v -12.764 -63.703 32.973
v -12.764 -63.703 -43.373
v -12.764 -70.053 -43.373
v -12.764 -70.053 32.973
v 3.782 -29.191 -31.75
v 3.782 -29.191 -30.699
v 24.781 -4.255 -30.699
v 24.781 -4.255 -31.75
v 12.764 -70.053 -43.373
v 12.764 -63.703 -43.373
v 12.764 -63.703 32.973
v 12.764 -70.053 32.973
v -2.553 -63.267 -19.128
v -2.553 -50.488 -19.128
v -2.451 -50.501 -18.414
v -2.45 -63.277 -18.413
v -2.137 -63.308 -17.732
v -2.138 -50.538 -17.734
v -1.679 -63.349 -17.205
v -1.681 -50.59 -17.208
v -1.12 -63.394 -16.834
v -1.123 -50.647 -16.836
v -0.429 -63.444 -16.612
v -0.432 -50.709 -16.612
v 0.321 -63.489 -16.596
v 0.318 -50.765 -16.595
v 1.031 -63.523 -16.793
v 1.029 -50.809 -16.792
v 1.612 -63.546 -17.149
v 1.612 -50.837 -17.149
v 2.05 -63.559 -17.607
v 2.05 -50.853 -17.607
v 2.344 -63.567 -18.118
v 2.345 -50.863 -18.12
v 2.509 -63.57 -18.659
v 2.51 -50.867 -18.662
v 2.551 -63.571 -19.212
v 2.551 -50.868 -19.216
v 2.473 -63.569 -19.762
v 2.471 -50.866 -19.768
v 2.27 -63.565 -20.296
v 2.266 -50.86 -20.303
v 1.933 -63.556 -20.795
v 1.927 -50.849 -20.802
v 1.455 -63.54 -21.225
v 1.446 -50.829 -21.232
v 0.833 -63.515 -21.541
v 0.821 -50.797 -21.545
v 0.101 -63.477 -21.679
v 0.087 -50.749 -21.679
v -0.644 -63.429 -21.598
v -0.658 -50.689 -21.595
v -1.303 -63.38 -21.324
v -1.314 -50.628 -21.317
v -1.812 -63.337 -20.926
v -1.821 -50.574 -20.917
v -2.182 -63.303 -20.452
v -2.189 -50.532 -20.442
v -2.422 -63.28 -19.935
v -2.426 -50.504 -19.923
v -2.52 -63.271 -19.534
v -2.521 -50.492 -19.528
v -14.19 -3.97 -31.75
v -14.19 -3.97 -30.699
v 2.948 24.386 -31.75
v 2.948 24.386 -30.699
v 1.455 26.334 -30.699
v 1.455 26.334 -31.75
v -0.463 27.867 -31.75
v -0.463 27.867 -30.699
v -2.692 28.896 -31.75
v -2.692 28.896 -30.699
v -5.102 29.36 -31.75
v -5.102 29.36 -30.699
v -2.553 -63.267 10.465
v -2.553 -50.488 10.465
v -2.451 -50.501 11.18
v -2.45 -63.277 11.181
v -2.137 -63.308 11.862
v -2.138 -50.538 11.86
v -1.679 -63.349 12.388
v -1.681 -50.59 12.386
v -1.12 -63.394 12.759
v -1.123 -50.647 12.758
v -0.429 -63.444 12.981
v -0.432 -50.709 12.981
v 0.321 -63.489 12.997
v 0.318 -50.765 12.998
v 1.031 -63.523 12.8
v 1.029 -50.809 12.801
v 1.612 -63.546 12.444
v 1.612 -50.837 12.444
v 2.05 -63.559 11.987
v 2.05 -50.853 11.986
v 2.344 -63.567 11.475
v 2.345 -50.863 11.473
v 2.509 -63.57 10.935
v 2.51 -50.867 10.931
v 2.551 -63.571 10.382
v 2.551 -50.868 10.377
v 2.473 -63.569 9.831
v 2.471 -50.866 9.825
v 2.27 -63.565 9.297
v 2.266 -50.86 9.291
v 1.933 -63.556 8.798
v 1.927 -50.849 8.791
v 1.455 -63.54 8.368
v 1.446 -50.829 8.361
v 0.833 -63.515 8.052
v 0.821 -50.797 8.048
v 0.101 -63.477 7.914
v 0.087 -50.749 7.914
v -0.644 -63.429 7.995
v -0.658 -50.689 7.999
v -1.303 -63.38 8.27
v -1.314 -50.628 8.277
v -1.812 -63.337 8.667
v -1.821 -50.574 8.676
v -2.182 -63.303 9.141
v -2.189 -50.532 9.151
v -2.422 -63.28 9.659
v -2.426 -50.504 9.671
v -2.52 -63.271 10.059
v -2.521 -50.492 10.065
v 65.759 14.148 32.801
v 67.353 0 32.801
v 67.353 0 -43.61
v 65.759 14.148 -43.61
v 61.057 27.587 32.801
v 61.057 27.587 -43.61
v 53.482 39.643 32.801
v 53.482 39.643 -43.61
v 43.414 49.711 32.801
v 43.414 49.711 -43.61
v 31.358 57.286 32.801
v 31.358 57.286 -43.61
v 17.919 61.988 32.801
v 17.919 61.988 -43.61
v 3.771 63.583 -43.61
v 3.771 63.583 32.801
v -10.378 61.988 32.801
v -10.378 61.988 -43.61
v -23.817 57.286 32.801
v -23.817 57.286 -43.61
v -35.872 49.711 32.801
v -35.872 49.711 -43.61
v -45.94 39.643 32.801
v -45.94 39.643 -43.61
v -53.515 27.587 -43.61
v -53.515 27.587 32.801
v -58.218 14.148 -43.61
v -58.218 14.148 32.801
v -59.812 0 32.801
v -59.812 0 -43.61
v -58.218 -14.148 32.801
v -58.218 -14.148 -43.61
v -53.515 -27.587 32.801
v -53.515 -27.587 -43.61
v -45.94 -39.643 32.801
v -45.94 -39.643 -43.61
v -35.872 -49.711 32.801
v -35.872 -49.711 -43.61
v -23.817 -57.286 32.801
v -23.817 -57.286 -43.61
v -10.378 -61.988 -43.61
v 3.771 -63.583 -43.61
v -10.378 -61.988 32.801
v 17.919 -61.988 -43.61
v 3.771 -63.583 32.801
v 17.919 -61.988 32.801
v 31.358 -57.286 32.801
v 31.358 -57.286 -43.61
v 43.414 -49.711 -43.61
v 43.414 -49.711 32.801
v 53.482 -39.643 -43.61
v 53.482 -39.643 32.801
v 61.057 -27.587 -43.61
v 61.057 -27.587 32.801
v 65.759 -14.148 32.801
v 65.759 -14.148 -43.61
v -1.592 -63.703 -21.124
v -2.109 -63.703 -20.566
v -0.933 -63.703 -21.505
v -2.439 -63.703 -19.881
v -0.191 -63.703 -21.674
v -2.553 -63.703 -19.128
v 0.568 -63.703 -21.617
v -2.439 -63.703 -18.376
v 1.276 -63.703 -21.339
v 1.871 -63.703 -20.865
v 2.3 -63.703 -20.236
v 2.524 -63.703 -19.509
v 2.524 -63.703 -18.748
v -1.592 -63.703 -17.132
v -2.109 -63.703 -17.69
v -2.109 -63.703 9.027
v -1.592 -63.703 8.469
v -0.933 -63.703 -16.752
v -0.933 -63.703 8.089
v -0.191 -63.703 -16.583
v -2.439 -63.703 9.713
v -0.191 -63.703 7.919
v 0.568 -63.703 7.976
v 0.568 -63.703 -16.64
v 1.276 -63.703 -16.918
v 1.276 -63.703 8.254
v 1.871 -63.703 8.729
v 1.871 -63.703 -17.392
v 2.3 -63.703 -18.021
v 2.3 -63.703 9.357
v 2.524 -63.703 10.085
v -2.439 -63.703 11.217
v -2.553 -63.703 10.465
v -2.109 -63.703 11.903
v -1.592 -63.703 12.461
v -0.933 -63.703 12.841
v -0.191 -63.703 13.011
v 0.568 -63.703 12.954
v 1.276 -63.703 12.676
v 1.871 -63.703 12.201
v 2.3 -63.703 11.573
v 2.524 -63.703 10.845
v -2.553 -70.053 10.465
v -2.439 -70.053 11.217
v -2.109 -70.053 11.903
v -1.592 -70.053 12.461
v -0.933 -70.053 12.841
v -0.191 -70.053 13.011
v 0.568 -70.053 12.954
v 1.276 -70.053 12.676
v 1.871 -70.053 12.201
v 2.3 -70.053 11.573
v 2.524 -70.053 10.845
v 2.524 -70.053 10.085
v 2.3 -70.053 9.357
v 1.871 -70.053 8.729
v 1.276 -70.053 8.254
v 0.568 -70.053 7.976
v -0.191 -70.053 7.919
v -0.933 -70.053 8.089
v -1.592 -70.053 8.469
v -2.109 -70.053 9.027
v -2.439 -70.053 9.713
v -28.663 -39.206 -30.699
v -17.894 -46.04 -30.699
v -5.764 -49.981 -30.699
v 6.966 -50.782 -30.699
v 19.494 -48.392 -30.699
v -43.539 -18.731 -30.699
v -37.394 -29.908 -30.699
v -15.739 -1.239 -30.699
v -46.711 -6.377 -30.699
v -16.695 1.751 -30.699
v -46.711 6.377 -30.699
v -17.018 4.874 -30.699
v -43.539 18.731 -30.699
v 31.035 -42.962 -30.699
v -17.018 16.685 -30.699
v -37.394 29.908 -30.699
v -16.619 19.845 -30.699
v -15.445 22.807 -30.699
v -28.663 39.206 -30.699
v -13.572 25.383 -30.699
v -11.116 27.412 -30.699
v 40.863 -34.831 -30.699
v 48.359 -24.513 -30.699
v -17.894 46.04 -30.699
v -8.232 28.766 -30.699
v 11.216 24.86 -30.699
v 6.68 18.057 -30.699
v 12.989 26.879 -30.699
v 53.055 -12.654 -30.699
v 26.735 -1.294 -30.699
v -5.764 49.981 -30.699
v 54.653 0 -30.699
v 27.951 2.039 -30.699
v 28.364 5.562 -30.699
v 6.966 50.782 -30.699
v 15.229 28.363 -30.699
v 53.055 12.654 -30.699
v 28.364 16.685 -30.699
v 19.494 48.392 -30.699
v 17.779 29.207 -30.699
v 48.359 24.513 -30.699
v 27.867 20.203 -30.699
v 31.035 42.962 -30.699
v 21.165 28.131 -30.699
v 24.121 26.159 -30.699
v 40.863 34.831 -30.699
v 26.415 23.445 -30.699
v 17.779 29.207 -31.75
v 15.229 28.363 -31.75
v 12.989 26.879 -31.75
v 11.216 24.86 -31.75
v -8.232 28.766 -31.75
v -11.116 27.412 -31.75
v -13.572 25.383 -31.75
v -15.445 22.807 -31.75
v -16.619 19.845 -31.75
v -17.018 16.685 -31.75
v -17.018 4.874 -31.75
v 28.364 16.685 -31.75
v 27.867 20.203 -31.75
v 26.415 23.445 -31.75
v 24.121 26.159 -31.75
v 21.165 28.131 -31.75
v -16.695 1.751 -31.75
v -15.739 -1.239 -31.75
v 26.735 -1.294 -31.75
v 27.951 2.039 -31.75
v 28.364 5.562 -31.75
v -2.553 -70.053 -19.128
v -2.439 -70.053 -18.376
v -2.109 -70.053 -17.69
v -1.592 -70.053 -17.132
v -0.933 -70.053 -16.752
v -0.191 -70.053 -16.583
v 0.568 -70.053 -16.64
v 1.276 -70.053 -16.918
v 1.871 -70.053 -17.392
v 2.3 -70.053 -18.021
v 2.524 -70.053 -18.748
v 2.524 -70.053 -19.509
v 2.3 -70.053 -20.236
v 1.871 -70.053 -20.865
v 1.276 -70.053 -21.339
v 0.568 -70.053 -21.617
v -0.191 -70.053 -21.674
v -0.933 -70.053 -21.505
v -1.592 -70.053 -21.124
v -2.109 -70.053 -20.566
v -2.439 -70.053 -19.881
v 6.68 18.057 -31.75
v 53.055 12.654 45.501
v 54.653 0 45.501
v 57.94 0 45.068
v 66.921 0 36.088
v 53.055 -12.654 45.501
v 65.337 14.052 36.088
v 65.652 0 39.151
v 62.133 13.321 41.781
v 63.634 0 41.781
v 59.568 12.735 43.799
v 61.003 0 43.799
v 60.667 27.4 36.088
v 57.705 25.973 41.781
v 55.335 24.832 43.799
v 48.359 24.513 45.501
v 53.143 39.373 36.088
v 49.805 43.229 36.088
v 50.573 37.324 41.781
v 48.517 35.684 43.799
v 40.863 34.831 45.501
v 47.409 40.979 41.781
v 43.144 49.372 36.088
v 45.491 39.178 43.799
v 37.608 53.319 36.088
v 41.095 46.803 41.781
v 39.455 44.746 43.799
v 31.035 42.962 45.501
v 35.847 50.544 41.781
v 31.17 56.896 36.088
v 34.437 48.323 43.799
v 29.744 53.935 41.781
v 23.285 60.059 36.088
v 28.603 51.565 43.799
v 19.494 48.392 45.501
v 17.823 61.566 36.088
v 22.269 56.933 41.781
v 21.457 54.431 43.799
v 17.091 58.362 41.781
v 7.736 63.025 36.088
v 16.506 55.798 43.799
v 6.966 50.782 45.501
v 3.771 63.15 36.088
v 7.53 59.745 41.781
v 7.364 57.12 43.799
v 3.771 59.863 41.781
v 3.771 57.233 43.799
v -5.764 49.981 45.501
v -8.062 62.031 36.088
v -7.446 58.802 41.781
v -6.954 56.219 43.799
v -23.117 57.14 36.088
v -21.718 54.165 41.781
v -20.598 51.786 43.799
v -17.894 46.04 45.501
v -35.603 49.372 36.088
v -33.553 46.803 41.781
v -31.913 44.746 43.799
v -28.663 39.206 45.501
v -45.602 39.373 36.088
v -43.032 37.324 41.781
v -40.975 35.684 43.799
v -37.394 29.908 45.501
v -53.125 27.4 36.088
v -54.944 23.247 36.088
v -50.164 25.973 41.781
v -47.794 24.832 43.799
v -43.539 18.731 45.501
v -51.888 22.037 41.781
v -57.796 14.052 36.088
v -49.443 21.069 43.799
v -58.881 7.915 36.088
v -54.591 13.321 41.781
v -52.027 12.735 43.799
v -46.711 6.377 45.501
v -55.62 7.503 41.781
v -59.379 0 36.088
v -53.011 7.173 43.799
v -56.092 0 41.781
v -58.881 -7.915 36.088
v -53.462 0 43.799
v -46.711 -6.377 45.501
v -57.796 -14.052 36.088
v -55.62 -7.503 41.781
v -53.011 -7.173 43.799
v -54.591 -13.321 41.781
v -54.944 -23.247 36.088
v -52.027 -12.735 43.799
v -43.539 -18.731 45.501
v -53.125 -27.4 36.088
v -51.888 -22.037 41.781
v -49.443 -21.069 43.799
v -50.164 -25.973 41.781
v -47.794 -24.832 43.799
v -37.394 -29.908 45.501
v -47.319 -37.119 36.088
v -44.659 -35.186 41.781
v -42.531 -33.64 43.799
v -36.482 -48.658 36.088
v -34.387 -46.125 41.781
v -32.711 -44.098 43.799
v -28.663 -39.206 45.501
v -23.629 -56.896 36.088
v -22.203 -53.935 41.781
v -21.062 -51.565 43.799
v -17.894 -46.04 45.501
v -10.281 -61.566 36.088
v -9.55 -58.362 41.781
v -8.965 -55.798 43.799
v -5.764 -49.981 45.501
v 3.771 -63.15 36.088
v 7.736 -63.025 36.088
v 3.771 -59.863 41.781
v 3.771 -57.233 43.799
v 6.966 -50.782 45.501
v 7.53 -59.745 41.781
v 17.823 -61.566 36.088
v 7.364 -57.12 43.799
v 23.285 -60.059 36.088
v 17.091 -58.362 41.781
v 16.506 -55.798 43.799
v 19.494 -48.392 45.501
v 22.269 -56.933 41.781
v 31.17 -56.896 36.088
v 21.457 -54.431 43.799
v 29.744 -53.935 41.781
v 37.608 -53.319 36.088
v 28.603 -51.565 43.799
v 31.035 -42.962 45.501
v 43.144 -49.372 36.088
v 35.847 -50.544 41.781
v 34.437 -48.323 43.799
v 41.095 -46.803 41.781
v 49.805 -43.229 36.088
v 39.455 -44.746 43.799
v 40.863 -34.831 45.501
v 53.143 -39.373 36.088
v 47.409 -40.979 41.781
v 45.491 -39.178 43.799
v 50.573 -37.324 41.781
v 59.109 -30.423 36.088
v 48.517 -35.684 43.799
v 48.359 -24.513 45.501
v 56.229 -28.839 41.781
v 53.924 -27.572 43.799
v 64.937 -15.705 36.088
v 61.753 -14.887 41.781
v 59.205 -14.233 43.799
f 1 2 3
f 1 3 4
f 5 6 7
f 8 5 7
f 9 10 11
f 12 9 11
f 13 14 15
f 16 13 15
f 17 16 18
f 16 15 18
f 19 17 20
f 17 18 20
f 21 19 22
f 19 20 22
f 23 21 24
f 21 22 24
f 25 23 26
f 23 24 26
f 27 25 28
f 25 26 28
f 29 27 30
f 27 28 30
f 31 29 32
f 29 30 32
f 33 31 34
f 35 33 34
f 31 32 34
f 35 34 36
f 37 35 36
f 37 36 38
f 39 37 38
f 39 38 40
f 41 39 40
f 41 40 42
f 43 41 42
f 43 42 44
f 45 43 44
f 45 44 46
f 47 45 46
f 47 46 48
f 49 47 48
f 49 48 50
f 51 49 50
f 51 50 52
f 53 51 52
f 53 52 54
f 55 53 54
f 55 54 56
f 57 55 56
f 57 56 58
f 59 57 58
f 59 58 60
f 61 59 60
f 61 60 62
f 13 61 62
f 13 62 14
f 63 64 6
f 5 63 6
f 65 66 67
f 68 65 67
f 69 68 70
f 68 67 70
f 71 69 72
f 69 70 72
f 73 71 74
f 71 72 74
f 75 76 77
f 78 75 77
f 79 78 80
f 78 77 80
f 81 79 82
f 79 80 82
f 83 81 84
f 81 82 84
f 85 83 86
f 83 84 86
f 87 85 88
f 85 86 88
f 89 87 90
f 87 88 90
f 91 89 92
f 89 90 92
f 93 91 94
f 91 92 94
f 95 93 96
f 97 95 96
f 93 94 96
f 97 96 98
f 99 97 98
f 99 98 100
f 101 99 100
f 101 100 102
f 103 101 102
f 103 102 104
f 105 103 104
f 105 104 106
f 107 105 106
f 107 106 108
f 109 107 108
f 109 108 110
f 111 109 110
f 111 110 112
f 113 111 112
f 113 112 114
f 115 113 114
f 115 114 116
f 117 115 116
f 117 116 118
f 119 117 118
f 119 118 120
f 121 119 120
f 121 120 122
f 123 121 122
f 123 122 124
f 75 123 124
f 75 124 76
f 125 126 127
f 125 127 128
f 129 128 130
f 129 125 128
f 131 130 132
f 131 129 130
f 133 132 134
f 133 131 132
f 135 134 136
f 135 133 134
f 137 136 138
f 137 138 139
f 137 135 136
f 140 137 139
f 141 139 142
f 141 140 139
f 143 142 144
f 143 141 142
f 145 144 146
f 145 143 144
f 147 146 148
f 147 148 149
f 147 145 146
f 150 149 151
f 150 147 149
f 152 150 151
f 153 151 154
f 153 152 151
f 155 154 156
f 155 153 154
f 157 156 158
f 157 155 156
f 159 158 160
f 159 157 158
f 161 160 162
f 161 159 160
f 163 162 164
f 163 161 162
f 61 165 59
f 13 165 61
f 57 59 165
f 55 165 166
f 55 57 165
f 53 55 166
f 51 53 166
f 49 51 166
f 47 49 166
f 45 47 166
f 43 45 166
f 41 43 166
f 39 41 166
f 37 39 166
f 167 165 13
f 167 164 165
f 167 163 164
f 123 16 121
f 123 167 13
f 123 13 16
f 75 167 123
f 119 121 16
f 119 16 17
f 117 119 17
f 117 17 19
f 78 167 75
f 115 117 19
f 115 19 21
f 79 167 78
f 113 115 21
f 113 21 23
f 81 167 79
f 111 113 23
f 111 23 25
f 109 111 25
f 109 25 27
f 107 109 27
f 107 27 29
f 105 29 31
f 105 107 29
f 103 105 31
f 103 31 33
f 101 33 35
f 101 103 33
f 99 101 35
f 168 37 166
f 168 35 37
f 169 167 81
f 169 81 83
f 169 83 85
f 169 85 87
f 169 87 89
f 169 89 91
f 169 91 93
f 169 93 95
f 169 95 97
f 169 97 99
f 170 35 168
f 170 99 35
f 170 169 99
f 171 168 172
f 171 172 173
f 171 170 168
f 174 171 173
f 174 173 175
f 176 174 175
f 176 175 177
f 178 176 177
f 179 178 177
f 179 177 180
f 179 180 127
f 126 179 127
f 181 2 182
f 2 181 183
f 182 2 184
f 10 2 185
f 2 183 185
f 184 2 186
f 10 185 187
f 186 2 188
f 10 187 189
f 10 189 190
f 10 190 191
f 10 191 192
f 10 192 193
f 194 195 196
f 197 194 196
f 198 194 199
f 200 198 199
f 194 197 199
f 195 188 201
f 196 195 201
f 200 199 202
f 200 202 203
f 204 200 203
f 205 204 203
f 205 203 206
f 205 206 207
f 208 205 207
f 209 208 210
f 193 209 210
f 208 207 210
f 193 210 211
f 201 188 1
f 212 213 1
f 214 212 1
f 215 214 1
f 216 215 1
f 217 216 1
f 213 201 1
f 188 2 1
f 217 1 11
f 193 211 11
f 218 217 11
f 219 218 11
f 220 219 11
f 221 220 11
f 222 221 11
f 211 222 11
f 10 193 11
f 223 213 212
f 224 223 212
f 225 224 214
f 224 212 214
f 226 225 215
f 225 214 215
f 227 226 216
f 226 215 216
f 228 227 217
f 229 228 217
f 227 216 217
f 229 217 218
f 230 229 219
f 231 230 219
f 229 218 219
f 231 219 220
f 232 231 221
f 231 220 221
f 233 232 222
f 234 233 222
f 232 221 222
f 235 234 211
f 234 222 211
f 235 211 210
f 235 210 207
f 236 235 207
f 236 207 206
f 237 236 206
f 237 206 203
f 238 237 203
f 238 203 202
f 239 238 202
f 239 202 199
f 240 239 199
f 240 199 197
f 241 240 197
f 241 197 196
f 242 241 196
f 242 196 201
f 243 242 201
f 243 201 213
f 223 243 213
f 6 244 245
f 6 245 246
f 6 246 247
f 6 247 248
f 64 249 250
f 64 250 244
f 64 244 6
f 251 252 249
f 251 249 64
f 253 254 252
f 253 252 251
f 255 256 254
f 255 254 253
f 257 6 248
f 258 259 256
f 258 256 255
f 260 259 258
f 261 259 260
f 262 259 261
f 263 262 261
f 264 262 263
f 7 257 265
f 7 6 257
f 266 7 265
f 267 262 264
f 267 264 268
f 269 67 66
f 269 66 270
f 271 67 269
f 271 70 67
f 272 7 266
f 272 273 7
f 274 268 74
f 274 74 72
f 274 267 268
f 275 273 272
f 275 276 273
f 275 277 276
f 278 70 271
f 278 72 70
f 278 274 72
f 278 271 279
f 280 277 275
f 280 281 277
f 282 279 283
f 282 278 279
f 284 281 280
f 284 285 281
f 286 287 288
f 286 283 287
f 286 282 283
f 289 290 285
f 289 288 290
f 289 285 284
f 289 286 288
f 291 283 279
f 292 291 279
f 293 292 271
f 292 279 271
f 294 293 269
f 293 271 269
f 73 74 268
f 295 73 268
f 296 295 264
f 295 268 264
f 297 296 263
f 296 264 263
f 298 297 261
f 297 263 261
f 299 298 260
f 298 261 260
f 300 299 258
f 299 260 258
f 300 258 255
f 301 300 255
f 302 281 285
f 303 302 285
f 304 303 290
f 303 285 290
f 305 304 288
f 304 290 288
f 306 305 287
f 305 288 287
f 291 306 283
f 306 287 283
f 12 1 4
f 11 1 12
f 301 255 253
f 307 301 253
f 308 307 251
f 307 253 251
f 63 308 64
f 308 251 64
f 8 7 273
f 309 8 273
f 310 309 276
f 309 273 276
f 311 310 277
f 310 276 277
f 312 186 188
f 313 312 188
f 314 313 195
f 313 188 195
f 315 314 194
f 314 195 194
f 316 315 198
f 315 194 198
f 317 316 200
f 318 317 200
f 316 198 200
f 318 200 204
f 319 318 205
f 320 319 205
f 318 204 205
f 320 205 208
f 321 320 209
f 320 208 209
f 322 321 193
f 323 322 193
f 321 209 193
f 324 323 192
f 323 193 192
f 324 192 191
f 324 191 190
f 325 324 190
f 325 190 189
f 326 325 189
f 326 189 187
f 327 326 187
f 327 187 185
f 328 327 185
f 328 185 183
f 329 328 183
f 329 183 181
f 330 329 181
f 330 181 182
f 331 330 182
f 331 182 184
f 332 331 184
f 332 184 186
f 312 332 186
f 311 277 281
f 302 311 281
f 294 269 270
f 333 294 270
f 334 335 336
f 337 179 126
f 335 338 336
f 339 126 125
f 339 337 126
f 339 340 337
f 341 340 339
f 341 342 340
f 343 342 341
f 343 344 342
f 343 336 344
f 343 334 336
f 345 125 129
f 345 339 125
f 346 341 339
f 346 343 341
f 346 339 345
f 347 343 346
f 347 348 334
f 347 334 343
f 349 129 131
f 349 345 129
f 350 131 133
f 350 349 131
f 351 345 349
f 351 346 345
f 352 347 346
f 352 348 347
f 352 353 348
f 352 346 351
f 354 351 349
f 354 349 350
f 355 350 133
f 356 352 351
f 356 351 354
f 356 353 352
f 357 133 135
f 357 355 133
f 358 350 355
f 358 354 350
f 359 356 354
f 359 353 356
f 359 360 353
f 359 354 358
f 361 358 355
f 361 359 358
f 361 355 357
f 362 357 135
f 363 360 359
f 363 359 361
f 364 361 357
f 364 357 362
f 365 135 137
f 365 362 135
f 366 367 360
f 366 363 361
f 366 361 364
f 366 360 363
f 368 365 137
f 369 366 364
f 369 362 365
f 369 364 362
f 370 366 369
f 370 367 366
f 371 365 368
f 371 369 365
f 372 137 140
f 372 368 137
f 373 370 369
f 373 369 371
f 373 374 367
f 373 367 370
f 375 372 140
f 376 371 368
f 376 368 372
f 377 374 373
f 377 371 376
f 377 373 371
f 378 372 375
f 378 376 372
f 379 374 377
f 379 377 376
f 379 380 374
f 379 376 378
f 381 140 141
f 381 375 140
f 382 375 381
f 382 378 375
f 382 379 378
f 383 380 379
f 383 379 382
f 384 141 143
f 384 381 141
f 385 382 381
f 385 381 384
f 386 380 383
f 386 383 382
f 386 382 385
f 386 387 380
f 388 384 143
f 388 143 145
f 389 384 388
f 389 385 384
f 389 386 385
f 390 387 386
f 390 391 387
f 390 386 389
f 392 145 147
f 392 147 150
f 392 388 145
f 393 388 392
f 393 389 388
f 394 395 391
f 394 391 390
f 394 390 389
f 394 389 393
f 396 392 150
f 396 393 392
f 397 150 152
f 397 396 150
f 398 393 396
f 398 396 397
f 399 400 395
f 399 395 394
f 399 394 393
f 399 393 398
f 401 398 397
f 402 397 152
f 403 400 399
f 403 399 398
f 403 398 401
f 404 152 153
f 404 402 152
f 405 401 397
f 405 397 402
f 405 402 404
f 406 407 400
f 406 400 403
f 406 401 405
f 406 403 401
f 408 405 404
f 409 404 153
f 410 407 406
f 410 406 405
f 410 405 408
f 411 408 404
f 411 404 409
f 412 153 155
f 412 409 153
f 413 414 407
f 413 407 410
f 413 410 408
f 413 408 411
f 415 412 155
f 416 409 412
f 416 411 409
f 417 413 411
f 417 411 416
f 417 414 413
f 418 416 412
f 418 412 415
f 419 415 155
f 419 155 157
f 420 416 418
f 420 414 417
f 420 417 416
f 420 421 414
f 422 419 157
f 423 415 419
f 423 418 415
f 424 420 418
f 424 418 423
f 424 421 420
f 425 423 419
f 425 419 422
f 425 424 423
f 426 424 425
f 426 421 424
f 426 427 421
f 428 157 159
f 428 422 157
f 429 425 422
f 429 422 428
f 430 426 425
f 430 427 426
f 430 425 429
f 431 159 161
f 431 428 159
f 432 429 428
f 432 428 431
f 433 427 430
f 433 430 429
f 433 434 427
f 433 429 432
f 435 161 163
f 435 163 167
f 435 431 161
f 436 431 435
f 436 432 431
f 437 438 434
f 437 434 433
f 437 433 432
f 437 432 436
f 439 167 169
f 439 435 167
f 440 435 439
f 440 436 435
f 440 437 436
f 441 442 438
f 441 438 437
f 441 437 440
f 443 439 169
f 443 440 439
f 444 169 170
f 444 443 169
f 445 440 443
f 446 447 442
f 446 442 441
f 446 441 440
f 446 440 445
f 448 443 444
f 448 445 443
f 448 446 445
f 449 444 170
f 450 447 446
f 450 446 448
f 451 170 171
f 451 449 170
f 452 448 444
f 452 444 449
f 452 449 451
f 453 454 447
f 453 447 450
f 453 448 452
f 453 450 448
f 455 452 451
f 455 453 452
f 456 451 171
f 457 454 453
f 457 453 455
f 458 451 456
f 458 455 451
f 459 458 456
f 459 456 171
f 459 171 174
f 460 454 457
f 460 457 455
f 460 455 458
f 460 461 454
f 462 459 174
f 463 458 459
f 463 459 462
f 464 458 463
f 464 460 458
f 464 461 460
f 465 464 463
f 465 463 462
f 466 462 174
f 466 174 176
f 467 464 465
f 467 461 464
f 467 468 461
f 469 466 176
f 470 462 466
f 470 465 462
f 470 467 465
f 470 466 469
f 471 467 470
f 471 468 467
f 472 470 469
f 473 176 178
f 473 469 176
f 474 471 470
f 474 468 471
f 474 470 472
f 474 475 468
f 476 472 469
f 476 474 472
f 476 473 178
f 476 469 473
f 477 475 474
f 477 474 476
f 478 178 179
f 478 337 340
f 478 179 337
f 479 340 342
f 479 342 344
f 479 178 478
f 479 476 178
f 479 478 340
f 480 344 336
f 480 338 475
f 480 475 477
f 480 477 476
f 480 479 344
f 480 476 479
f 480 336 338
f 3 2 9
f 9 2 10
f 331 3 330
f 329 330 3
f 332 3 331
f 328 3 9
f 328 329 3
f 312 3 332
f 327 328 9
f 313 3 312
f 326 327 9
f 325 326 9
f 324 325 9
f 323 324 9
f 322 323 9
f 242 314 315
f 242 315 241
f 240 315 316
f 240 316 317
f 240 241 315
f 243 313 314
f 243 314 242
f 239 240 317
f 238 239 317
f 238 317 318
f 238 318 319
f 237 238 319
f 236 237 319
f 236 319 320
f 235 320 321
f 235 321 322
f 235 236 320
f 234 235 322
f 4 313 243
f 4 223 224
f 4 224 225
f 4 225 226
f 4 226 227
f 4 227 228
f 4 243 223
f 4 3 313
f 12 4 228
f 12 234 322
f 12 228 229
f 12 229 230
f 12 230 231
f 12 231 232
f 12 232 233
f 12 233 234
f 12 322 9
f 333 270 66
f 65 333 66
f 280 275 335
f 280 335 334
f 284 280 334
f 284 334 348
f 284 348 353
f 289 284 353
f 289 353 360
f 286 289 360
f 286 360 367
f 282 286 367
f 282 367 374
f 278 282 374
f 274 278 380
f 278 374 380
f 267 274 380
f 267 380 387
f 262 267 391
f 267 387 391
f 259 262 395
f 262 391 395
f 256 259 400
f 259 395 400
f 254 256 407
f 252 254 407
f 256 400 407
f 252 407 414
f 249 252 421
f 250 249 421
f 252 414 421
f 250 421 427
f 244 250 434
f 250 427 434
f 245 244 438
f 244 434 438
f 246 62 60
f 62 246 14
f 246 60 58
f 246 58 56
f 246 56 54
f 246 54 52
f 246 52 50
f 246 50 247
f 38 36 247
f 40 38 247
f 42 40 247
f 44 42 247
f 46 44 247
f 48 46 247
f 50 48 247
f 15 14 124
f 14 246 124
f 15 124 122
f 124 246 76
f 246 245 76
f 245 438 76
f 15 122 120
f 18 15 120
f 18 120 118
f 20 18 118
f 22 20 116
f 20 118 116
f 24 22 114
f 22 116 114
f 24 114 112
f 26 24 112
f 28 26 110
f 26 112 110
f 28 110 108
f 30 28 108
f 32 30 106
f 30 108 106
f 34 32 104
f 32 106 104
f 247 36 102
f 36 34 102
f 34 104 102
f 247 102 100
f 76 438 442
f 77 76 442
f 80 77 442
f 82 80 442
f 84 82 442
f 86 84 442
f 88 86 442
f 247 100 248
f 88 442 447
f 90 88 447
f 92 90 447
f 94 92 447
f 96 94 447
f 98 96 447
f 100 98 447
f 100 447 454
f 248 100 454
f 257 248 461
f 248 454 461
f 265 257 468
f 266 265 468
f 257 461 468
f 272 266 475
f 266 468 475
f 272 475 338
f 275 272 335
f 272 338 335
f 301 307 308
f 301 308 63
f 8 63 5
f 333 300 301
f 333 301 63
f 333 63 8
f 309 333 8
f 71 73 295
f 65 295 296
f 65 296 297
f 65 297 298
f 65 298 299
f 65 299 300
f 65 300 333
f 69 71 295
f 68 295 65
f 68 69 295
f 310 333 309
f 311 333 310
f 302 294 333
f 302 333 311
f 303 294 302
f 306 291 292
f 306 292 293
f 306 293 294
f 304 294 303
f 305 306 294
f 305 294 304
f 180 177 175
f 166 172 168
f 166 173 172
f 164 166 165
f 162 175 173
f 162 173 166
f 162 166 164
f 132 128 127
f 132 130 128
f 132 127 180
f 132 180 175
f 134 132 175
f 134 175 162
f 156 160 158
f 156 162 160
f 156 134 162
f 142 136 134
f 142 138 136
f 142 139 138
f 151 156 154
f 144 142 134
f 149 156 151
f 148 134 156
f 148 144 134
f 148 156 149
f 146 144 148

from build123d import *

# Parameters (mm, degrees)
F2_DEPTH   = 76.2
F4_W       = 25.5275620148
F4_H       = 76.3463266194
F5_DEPTH   = 6.35
F9_D       = 5.1054
F9_DEPTH   = 38.1
F9_TIP     = 1.5338169022
F9_2_D     = 5.1054
F9_2_DEPTH = 38.1
F9_2_TIP   = 1.5338169022
F12_DEPTH  = 6.35


# Not quite as in the source:
# - a feature of the source that left no trace in its solid (it failed there, or was rolled back) is left out


with BuildPart() as f1:
    # F0 (on Front) → F1 (revolve)
    with BuildSketch(Plane.XZ):
        with BuildLine():
            Line((54.6532709479, 45.5005168915), (3.770736279, 45.5005168915))
            Line((3.770736279, 45.5005168915), (3.770736279, -43.609585613))
            Line((3.770736279, -43.609585613), (67.3532709479, -43.609585613))
            Line((67.3532709479, -43.609585613), (67.3532709479, 32.8005168915))
            ThreePointArc((67.3532709479, 32.8005168915), (63.633527069, 41.7807730125), (54.6532709479, 45.5005168915))
        make_face()
    revolve(axis=Axis((3.770736279, 0, 0.9454656392), (0, 0, 1)))

    # F2 (cut): a face of the model
    f2_faces = [f1.faces().sort_by_distance(p)[0] for p in [
        (3.770736279, 0, 45.5005168915),
    ]]
    extrude(f2_faces, amount=-F2_DEPTH, mode=Mode.SUBTRACT)

    # F9
    with Locations(Plane.XZ.offset(70.0532)):
        with Locations((0, 10.4649914429), (0, -19.1282723099)):
            Hole(F9_D / 2, depth=F9_DEPTH)
            with Locations((0, 0, -(F9_DEPTH + F9_TIP / 2))):  # 118° drill point
                Cone(0, F9_D / 2, F9_TIP, mode=Mode.SUBTRACT)

    # F11 (on offset) → F12 (cut)
    with BuildSketch(Plane.XY.offset(-25.4)):
        with BuildLine():
            Line((-14.1898515568, -3.9695769455), (3.7818609271, -29.1912425309))
            Line((3.7818609271, -29.1912425309), (24.7812050342, -4.254519477))
            ThreePointArc((24.7812050342, -4.254519477), (27.4402781426, 0.33711338), (28.3639580011, 5.5621088449))
            Line((28.3639580011, 5.5621088449), (28.3639580011, 16.6845112958))
            ThreePointArc((28.3639580011, 16.6845112958), (25.3632832083, 24.8828703101), (17.7792193355, 29.2071176335))
            ThreePointArc((17.7792193355, 29.2071176335), (14.0594292862, 27.6952065298), (11.2158715142, 24.860265191))
            Line((11.2158715142, 24.860265191), (6.6803421116, 18.0569709152))
            Line((6.6803421116, 18.0569709152), (2.9480526056, 24.3856378285))
            ThreePointArc((2.9480526056, 24.3856378285), (-0.4625819691, 27.8674846274), (-5.1023244743, 29.3602923235))
            ThreePointArc((-5.1023244743, 29.3602923235), (-13.5716495731, 25.3831851413), (-17.0183759183, 16.6845112958))
            Line((-17.0183759183, 16.6845112958), (-17.0183759183, 4.8742272403))
            ThreePointArc((-17.0183759183, 4.8742272403), (-16.2940310659, 0.2316680716), (-14.1898515568, -3.9695769455))
        make_face()
    extrude(amount=-F12_DEPTH, mode=Mode.SUBTRACT)


with BuildPart() as f5:
    # F4 (on offset) → F5 (new body)
    with BuildSketch(Plane.XZ.offset(63.7032)):
        with Locations((-4.657e-07, -5.2000600845)):
            Rectangle(F4_W, F4_H)
    extrude(amount=F5_DEPTH)

    # F9#2
    with Locations(Plane.XZ.offset(70.0532)):
        with Locations((0, 10.4649914429), (0, -19.1282723099)):
            Hole(F9_2_D / 2, depth=F9_2_DEPTH)
            with Locations((0, 0, -(F9_2_DEPTH + F9_2_TIP / 2))):  # 118° drill point
                Cone(0, F9_2_D / 2, F9_2_TIP, mode=Mode.SUBTRACT)


solid = Compound([f1.part, f5.part])
